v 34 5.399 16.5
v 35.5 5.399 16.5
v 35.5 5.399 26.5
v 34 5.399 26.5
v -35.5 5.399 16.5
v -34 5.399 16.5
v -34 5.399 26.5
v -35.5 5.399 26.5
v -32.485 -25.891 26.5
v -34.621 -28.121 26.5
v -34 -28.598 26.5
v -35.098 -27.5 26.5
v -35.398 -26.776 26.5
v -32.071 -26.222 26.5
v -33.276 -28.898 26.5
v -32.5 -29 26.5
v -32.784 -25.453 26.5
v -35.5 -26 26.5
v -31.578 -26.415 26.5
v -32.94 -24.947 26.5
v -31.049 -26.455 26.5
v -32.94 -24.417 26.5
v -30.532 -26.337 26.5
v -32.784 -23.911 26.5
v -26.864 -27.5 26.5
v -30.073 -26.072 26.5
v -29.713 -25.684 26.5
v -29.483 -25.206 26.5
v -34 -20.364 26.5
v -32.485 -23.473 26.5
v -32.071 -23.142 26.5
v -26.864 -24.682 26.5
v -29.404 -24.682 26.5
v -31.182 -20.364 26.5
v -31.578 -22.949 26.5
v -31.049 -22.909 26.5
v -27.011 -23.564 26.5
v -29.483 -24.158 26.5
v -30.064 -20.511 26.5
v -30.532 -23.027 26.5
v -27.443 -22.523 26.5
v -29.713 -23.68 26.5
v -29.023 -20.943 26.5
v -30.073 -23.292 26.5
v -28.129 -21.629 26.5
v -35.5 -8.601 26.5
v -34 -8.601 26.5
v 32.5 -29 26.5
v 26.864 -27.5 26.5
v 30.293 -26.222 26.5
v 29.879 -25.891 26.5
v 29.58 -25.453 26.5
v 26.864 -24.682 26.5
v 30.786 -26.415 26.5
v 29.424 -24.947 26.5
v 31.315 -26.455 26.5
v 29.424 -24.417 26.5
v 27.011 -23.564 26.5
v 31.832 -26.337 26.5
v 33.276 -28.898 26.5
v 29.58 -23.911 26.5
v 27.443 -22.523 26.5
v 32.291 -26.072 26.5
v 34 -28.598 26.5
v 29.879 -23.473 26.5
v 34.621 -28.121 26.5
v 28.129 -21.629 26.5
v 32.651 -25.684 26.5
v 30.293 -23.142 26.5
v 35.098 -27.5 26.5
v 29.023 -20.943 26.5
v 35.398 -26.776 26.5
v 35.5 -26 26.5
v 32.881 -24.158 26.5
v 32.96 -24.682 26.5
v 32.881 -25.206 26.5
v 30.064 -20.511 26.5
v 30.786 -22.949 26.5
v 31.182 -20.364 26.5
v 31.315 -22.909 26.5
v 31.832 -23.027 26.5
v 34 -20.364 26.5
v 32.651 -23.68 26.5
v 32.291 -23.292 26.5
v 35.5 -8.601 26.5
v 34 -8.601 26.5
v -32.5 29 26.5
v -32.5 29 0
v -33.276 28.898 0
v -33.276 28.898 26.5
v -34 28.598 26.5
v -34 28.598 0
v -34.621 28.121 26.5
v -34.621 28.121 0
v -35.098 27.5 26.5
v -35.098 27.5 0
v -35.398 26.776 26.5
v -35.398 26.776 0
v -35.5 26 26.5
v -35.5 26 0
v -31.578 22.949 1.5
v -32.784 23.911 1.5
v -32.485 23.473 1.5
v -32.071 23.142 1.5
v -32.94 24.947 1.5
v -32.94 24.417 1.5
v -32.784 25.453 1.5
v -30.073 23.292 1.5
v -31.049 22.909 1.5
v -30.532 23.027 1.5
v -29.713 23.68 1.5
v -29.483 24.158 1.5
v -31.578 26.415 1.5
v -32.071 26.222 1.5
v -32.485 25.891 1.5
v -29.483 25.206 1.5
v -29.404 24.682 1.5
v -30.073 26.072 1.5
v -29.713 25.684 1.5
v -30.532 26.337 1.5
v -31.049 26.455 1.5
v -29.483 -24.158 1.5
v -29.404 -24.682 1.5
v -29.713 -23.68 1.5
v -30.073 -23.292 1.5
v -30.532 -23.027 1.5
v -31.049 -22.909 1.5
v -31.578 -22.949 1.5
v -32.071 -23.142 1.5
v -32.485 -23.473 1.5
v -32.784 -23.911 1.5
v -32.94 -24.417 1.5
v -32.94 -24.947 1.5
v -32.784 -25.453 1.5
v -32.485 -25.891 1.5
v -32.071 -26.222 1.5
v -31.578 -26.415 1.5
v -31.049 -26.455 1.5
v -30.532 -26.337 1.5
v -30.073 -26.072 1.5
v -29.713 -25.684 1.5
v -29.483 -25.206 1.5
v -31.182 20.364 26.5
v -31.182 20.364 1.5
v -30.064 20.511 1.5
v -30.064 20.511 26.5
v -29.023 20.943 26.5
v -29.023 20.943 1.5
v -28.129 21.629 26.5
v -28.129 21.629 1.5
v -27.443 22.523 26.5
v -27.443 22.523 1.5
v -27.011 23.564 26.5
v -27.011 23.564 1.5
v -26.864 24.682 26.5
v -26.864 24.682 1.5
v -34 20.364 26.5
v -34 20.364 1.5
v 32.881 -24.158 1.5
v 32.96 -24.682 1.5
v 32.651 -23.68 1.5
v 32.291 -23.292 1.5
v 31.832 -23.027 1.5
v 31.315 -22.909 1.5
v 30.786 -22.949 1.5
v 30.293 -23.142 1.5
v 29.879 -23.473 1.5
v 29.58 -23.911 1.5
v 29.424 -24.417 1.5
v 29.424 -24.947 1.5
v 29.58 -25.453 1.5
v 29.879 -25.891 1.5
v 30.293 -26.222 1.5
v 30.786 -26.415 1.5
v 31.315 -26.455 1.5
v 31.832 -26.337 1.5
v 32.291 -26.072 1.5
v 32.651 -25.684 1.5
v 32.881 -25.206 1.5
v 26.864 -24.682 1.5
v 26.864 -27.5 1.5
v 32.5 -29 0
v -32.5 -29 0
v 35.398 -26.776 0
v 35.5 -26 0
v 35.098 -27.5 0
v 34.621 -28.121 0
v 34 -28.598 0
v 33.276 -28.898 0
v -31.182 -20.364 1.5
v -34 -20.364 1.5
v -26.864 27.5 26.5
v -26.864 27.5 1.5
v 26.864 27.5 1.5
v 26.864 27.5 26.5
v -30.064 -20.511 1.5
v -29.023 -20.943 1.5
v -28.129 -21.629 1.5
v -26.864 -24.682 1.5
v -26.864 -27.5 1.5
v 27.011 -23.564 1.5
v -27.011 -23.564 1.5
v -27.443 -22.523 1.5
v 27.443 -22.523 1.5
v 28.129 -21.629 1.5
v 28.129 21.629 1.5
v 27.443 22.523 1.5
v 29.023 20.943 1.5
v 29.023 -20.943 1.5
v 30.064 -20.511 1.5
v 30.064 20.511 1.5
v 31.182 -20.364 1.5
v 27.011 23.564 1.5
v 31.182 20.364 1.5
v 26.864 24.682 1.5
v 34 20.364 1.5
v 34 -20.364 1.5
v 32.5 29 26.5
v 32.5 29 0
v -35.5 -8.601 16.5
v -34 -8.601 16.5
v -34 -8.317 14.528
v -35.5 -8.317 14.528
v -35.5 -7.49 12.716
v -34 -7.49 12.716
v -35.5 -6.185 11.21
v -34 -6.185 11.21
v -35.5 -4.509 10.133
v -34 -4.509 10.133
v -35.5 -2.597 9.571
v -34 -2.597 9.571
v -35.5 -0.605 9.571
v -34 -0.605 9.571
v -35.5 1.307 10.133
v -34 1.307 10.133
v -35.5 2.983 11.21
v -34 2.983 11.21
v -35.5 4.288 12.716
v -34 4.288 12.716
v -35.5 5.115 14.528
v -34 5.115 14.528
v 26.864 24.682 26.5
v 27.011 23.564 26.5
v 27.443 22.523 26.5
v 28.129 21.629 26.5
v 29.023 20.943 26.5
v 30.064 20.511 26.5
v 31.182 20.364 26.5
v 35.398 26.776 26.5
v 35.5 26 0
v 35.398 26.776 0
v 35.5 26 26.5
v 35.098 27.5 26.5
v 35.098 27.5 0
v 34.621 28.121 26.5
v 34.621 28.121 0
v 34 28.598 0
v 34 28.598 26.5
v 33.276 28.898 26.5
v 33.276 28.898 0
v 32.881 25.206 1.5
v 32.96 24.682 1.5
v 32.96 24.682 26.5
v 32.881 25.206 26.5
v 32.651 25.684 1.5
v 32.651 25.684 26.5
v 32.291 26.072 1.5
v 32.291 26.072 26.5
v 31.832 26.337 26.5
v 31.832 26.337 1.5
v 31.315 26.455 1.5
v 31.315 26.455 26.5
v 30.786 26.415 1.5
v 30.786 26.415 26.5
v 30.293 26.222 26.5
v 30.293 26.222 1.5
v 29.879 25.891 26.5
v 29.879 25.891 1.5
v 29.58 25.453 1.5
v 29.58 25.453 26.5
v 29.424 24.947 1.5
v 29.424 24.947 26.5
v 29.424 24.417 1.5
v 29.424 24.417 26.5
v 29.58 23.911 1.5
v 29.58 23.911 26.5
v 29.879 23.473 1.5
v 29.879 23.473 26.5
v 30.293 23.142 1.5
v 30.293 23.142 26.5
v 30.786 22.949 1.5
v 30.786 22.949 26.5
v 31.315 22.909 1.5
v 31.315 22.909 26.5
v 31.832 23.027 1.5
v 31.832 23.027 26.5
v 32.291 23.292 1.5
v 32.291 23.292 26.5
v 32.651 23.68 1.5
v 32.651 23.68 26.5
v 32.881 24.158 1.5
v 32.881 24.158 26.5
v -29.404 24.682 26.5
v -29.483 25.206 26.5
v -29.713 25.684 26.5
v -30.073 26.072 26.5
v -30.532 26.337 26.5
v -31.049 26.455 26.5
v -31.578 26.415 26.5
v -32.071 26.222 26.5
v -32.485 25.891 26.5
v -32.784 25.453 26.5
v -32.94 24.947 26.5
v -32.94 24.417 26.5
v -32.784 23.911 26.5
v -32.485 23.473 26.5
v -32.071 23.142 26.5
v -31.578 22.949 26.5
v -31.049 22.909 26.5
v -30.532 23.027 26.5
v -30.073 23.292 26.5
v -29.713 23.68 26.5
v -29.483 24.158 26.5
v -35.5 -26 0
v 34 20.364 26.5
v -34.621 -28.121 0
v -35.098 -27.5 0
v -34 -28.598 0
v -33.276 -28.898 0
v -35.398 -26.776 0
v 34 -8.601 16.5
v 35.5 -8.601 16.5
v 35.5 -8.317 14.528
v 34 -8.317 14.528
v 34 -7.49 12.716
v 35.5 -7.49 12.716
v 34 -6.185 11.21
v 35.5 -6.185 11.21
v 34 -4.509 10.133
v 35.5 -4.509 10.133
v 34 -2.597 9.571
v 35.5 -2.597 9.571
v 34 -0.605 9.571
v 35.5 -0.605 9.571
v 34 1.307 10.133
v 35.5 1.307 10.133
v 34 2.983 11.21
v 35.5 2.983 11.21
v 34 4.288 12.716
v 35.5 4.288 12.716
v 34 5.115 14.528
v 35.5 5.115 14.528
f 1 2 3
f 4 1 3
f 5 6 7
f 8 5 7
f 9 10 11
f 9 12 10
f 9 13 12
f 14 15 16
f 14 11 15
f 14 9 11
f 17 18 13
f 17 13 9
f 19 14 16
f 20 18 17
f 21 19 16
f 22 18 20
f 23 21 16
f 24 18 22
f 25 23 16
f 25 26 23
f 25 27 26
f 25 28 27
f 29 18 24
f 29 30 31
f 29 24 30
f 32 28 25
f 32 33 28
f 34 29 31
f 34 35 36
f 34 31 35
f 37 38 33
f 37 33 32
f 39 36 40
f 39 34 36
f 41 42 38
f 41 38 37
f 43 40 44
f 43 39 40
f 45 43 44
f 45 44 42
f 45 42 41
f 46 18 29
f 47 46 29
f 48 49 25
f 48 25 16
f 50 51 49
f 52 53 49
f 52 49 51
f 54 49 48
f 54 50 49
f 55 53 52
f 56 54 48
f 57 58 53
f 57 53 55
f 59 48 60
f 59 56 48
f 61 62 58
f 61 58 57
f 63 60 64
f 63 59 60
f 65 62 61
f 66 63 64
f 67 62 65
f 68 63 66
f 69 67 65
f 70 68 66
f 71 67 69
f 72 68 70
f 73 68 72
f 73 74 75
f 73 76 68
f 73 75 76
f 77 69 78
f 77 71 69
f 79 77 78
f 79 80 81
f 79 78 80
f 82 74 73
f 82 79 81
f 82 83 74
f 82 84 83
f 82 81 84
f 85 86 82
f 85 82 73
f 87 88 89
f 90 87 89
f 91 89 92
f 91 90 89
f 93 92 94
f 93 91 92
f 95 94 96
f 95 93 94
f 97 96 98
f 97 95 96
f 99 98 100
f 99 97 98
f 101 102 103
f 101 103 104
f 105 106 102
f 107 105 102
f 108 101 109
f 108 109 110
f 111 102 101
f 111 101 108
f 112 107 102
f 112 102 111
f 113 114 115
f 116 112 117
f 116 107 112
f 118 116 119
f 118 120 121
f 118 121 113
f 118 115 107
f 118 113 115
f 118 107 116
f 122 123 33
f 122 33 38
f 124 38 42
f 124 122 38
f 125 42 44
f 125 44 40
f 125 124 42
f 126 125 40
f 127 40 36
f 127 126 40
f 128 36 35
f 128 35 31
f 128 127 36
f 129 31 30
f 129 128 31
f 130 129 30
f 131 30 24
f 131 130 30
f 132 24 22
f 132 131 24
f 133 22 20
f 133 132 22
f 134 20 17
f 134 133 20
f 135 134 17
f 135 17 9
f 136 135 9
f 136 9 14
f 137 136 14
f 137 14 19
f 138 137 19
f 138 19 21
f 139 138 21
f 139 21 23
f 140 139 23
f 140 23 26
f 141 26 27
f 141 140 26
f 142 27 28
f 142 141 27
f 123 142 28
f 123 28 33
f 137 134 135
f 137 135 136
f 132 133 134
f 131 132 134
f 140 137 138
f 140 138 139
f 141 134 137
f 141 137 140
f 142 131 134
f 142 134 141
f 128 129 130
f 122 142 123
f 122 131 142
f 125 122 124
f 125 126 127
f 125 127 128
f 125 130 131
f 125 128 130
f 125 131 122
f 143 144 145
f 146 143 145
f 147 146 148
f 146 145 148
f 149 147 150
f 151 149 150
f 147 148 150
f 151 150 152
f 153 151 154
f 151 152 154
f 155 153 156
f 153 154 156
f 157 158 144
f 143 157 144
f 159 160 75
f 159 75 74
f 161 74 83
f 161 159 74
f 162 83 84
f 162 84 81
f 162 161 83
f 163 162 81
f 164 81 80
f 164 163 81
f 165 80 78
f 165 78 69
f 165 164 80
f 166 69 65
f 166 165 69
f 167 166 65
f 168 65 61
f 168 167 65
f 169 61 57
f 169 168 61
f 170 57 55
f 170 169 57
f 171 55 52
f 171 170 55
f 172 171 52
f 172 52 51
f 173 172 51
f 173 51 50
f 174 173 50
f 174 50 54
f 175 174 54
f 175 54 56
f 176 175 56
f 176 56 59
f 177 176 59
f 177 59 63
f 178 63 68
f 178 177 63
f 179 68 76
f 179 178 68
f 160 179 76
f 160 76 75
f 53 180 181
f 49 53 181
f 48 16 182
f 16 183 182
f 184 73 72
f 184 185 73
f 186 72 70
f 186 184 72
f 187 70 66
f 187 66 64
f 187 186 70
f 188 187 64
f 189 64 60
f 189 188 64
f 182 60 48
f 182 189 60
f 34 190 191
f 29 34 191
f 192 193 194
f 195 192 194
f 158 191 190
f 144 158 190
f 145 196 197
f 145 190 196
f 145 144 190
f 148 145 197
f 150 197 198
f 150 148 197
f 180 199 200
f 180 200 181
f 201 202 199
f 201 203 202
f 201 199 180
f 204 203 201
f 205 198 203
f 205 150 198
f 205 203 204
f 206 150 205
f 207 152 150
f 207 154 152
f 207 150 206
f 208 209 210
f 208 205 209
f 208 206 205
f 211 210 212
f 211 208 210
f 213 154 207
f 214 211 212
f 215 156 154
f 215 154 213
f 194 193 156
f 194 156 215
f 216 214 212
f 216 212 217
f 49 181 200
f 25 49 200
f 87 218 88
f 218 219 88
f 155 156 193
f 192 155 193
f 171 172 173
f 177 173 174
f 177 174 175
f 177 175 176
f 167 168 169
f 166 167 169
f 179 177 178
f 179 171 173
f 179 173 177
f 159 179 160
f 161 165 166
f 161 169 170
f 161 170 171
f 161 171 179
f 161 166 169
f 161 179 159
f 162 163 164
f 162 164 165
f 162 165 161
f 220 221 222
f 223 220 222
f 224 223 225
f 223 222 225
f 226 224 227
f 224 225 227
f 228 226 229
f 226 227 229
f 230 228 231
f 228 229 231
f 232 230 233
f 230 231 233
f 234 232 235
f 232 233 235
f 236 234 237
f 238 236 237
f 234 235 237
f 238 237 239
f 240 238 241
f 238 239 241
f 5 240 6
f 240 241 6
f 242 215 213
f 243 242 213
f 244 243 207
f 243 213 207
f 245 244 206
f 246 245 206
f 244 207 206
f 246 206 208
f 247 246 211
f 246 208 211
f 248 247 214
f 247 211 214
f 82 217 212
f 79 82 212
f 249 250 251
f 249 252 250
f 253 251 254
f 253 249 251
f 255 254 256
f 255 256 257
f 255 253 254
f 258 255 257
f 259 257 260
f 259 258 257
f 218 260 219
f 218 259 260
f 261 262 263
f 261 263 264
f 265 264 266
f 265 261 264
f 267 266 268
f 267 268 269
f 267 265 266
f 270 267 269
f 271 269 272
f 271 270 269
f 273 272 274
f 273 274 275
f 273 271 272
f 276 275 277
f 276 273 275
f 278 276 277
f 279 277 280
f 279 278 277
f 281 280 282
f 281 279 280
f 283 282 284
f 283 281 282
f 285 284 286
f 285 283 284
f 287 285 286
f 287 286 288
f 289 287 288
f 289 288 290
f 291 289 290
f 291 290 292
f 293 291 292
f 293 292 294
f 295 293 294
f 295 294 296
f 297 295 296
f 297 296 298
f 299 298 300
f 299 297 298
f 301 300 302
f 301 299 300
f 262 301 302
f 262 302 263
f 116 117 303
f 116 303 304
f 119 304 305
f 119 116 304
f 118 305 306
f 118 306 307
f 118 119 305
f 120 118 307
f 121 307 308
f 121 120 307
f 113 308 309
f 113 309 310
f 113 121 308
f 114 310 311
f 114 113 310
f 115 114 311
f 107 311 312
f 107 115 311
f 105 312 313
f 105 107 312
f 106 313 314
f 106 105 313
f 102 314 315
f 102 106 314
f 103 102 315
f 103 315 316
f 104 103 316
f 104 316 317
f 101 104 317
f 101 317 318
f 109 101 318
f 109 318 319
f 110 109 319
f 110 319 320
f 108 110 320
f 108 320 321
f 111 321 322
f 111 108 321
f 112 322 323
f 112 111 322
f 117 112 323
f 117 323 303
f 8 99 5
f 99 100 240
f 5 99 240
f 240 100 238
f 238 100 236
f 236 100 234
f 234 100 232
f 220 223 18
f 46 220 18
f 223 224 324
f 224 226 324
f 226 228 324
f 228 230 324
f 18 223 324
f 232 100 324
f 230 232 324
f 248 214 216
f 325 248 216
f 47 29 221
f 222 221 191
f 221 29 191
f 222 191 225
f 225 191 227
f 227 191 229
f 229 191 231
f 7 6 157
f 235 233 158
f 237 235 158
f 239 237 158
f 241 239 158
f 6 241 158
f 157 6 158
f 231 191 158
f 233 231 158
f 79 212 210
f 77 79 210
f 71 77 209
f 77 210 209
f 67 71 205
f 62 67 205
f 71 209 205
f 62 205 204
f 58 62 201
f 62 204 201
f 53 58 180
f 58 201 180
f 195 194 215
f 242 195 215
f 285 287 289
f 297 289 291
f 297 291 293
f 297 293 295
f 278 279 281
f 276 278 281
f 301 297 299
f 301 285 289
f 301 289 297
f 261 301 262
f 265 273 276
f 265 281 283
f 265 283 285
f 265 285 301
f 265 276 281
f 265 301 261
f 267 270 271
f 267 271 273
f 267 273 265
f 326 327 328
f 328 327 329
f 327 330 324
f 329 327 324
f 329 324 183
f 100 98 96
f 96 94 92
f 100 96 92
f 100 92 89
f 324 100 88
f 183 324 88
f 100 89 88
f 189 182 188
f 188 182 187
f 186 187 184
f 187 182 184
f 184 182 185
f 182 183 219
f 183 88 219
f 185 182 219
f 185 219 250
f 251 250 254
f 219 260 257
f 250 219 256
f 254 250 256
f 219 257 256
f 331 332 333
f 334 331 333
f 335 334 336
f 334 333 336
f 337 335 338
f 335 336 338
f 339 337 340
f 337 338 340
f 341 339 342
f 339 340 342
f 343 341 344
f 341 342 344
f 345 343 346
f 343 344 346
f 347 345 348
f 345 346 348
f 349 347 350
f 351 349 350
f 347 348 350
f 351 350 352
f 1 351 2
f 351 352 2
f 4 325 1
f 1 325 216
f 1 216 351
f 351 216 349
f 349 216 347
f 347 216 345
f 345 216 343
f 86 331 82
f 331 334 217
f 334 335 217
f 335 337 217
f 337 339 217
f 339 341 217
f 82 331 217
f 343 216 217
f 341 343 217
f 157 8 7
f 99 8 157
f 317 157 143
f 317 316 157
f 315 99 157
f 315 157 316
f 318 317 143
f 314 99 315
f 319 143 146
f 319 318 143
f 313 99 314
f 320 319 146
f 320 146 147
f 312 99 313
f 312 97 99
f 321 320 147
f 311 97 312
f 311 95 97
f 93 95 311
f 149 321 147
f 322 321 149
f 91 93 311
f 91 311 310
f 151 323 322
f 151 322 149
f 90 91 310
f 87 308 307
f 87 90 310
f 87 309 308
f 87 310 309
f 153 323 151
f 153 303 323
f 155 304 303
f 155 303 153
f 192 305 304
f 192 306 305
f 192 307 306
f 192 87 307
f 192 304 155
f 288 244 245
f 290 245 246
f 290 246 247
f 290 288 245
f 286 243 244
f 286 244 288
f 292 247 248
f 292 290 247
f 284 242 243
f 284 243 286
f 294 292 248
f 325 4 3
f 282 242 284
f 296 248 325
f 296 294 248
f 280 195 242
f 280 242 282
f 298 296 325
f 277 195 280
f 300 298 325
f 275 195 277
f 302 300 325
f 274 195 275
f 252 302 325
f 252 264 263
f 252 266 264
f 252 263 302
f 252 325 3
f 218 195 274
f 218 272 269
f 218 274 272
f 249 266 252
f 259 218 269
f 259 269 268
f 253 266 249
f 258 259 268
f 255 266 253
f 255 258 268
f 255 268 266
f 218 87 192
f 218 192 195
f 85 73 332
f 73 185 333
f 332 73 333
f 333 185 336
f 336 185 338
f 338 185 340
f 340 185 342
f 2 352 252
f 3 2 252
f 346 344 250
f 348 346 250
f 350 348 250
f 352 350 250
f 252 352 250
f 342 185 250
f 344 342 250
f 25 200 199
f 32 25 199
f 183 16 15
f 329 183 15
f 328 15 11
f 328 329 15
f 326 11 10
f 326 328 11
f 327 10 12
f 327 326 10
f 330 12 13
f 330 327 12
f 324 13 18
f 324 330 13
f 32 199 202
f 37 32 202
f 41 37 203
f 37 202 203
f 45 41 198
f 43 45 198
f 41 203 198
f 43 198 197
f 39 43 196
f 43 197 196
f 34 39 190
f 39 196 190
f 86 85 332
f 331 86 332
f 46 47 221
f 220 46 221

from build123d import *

# Parameters (mm, degrees)
F0_W     = 71
F0_H     = 58
F1_DEPTH = 1.5
F3_R     = 1.778
F4_DEPTH = 25
F6_DEPTH = 71.001
F7_R     = 3


with BuildPart() as f1:
    # F0 (on Top) → F1 (new body)
    with BuildSketch(Plane.XY):
        Rectangle(F0_W, F0_H)
    extrude(amount=F1_DEPTH)

    # F3 (on face) → F4 (join)
    with BuildSketch(Plane.XY.offset(1.5)):
        Polygon((35.5, -29), (35.5, 29), (-31.925, 29), (-35.5, 29), (-35.5, 23.9875), (-35.5, -29), align=None)
        with Locations((-31.182, -24.682)):
            Circle(F3_R, mode=Mode.SUBTRACT)
        with Locations((31.182, -24.682)):
            Circle(F3_R, mode=Mode.SUBTRACT)
        with Locations((-31.182, 24.682)):
            Circle(F3_R, mode=Mode.SUBTRACT)
        with BuildLine():
            Line((-26.864, 27.5), (26.864, 27.5))
            Line((26.864, 27.5), (26.864, 24.682))
            ThreePointArc((26.864, 24.682), (28.1287129188, 21.6287129188), (31.182, 20.364))
            Line((31.182, 20.364), (34, 20.364))
            Line((34, 20.364), (34, -20.364))
            Line((34, -20.364), (31.182, -20.364))
            ThreePointArc((31.182, -20.364), (28.1287129188, -21.6287129188), (26.864, -24.682))
            Line((26.864, -24.682), (26.864, -27.5))
            Line((26.864, -27.5), (-26.864, -27.5))
            Line((-26.864, -27.5), (-26.864, -24.682))
            ThreePointArc((-26.864, -24.682), (-28.1287129188, -21.6287129188), (-31.182, -20.364))
            Line((-31.182, -20.364), (-34, -20.364))
            Line((-34, -20.364), (-34, 20.364))
            Line((-34, 20.364), (-31.182, 20.364))
            ThreePointArc((-31.182, 20.364), (-28.1287129188, 21.6287129188), (-26.864, 24.682))
            Line((-26.864, 24.682), (-26.864, 27.5))
        make_face(mode=Mode.SUBTRACT)
        with Locations((31.182, 24.682)):
            Circle(F3_R, mode=Mode.SUBTRACT)
    extrude(amount=F4_DEPTH)

    # F5 (on face) → F6 (cut, through all)
    with BuildSketch(Plane.YZ.offset(35.5)):
        with BuildLine():
            Line((-8.60102, 26.5), (-8.60102, 16.5))
            ThreePointArc((-8.60102, 16.5), (-1.60102, 9.5), (5.39898, 16.5))
            Line((5.39898, 16.5), (5.39898, 26.5))
            Line((5.39898, 26.5), (-8.60102, 26.5))
        make_face()
    extrude(amount=-F6_DEPTH, mode=Mode.SUBTRACT)

    # F7
    f7_edges = [f1.edges().sort_by_distance(p)[0] for p in [
        (35.5, 29, 13.25),
        (35.5, -29, 13.25),
        (-35.5, 29, 13.25),
        (-35.5, -29, 13.25),
    ]]
    fillet(f7_edges, radius=F7_R)


solid = f1.part
